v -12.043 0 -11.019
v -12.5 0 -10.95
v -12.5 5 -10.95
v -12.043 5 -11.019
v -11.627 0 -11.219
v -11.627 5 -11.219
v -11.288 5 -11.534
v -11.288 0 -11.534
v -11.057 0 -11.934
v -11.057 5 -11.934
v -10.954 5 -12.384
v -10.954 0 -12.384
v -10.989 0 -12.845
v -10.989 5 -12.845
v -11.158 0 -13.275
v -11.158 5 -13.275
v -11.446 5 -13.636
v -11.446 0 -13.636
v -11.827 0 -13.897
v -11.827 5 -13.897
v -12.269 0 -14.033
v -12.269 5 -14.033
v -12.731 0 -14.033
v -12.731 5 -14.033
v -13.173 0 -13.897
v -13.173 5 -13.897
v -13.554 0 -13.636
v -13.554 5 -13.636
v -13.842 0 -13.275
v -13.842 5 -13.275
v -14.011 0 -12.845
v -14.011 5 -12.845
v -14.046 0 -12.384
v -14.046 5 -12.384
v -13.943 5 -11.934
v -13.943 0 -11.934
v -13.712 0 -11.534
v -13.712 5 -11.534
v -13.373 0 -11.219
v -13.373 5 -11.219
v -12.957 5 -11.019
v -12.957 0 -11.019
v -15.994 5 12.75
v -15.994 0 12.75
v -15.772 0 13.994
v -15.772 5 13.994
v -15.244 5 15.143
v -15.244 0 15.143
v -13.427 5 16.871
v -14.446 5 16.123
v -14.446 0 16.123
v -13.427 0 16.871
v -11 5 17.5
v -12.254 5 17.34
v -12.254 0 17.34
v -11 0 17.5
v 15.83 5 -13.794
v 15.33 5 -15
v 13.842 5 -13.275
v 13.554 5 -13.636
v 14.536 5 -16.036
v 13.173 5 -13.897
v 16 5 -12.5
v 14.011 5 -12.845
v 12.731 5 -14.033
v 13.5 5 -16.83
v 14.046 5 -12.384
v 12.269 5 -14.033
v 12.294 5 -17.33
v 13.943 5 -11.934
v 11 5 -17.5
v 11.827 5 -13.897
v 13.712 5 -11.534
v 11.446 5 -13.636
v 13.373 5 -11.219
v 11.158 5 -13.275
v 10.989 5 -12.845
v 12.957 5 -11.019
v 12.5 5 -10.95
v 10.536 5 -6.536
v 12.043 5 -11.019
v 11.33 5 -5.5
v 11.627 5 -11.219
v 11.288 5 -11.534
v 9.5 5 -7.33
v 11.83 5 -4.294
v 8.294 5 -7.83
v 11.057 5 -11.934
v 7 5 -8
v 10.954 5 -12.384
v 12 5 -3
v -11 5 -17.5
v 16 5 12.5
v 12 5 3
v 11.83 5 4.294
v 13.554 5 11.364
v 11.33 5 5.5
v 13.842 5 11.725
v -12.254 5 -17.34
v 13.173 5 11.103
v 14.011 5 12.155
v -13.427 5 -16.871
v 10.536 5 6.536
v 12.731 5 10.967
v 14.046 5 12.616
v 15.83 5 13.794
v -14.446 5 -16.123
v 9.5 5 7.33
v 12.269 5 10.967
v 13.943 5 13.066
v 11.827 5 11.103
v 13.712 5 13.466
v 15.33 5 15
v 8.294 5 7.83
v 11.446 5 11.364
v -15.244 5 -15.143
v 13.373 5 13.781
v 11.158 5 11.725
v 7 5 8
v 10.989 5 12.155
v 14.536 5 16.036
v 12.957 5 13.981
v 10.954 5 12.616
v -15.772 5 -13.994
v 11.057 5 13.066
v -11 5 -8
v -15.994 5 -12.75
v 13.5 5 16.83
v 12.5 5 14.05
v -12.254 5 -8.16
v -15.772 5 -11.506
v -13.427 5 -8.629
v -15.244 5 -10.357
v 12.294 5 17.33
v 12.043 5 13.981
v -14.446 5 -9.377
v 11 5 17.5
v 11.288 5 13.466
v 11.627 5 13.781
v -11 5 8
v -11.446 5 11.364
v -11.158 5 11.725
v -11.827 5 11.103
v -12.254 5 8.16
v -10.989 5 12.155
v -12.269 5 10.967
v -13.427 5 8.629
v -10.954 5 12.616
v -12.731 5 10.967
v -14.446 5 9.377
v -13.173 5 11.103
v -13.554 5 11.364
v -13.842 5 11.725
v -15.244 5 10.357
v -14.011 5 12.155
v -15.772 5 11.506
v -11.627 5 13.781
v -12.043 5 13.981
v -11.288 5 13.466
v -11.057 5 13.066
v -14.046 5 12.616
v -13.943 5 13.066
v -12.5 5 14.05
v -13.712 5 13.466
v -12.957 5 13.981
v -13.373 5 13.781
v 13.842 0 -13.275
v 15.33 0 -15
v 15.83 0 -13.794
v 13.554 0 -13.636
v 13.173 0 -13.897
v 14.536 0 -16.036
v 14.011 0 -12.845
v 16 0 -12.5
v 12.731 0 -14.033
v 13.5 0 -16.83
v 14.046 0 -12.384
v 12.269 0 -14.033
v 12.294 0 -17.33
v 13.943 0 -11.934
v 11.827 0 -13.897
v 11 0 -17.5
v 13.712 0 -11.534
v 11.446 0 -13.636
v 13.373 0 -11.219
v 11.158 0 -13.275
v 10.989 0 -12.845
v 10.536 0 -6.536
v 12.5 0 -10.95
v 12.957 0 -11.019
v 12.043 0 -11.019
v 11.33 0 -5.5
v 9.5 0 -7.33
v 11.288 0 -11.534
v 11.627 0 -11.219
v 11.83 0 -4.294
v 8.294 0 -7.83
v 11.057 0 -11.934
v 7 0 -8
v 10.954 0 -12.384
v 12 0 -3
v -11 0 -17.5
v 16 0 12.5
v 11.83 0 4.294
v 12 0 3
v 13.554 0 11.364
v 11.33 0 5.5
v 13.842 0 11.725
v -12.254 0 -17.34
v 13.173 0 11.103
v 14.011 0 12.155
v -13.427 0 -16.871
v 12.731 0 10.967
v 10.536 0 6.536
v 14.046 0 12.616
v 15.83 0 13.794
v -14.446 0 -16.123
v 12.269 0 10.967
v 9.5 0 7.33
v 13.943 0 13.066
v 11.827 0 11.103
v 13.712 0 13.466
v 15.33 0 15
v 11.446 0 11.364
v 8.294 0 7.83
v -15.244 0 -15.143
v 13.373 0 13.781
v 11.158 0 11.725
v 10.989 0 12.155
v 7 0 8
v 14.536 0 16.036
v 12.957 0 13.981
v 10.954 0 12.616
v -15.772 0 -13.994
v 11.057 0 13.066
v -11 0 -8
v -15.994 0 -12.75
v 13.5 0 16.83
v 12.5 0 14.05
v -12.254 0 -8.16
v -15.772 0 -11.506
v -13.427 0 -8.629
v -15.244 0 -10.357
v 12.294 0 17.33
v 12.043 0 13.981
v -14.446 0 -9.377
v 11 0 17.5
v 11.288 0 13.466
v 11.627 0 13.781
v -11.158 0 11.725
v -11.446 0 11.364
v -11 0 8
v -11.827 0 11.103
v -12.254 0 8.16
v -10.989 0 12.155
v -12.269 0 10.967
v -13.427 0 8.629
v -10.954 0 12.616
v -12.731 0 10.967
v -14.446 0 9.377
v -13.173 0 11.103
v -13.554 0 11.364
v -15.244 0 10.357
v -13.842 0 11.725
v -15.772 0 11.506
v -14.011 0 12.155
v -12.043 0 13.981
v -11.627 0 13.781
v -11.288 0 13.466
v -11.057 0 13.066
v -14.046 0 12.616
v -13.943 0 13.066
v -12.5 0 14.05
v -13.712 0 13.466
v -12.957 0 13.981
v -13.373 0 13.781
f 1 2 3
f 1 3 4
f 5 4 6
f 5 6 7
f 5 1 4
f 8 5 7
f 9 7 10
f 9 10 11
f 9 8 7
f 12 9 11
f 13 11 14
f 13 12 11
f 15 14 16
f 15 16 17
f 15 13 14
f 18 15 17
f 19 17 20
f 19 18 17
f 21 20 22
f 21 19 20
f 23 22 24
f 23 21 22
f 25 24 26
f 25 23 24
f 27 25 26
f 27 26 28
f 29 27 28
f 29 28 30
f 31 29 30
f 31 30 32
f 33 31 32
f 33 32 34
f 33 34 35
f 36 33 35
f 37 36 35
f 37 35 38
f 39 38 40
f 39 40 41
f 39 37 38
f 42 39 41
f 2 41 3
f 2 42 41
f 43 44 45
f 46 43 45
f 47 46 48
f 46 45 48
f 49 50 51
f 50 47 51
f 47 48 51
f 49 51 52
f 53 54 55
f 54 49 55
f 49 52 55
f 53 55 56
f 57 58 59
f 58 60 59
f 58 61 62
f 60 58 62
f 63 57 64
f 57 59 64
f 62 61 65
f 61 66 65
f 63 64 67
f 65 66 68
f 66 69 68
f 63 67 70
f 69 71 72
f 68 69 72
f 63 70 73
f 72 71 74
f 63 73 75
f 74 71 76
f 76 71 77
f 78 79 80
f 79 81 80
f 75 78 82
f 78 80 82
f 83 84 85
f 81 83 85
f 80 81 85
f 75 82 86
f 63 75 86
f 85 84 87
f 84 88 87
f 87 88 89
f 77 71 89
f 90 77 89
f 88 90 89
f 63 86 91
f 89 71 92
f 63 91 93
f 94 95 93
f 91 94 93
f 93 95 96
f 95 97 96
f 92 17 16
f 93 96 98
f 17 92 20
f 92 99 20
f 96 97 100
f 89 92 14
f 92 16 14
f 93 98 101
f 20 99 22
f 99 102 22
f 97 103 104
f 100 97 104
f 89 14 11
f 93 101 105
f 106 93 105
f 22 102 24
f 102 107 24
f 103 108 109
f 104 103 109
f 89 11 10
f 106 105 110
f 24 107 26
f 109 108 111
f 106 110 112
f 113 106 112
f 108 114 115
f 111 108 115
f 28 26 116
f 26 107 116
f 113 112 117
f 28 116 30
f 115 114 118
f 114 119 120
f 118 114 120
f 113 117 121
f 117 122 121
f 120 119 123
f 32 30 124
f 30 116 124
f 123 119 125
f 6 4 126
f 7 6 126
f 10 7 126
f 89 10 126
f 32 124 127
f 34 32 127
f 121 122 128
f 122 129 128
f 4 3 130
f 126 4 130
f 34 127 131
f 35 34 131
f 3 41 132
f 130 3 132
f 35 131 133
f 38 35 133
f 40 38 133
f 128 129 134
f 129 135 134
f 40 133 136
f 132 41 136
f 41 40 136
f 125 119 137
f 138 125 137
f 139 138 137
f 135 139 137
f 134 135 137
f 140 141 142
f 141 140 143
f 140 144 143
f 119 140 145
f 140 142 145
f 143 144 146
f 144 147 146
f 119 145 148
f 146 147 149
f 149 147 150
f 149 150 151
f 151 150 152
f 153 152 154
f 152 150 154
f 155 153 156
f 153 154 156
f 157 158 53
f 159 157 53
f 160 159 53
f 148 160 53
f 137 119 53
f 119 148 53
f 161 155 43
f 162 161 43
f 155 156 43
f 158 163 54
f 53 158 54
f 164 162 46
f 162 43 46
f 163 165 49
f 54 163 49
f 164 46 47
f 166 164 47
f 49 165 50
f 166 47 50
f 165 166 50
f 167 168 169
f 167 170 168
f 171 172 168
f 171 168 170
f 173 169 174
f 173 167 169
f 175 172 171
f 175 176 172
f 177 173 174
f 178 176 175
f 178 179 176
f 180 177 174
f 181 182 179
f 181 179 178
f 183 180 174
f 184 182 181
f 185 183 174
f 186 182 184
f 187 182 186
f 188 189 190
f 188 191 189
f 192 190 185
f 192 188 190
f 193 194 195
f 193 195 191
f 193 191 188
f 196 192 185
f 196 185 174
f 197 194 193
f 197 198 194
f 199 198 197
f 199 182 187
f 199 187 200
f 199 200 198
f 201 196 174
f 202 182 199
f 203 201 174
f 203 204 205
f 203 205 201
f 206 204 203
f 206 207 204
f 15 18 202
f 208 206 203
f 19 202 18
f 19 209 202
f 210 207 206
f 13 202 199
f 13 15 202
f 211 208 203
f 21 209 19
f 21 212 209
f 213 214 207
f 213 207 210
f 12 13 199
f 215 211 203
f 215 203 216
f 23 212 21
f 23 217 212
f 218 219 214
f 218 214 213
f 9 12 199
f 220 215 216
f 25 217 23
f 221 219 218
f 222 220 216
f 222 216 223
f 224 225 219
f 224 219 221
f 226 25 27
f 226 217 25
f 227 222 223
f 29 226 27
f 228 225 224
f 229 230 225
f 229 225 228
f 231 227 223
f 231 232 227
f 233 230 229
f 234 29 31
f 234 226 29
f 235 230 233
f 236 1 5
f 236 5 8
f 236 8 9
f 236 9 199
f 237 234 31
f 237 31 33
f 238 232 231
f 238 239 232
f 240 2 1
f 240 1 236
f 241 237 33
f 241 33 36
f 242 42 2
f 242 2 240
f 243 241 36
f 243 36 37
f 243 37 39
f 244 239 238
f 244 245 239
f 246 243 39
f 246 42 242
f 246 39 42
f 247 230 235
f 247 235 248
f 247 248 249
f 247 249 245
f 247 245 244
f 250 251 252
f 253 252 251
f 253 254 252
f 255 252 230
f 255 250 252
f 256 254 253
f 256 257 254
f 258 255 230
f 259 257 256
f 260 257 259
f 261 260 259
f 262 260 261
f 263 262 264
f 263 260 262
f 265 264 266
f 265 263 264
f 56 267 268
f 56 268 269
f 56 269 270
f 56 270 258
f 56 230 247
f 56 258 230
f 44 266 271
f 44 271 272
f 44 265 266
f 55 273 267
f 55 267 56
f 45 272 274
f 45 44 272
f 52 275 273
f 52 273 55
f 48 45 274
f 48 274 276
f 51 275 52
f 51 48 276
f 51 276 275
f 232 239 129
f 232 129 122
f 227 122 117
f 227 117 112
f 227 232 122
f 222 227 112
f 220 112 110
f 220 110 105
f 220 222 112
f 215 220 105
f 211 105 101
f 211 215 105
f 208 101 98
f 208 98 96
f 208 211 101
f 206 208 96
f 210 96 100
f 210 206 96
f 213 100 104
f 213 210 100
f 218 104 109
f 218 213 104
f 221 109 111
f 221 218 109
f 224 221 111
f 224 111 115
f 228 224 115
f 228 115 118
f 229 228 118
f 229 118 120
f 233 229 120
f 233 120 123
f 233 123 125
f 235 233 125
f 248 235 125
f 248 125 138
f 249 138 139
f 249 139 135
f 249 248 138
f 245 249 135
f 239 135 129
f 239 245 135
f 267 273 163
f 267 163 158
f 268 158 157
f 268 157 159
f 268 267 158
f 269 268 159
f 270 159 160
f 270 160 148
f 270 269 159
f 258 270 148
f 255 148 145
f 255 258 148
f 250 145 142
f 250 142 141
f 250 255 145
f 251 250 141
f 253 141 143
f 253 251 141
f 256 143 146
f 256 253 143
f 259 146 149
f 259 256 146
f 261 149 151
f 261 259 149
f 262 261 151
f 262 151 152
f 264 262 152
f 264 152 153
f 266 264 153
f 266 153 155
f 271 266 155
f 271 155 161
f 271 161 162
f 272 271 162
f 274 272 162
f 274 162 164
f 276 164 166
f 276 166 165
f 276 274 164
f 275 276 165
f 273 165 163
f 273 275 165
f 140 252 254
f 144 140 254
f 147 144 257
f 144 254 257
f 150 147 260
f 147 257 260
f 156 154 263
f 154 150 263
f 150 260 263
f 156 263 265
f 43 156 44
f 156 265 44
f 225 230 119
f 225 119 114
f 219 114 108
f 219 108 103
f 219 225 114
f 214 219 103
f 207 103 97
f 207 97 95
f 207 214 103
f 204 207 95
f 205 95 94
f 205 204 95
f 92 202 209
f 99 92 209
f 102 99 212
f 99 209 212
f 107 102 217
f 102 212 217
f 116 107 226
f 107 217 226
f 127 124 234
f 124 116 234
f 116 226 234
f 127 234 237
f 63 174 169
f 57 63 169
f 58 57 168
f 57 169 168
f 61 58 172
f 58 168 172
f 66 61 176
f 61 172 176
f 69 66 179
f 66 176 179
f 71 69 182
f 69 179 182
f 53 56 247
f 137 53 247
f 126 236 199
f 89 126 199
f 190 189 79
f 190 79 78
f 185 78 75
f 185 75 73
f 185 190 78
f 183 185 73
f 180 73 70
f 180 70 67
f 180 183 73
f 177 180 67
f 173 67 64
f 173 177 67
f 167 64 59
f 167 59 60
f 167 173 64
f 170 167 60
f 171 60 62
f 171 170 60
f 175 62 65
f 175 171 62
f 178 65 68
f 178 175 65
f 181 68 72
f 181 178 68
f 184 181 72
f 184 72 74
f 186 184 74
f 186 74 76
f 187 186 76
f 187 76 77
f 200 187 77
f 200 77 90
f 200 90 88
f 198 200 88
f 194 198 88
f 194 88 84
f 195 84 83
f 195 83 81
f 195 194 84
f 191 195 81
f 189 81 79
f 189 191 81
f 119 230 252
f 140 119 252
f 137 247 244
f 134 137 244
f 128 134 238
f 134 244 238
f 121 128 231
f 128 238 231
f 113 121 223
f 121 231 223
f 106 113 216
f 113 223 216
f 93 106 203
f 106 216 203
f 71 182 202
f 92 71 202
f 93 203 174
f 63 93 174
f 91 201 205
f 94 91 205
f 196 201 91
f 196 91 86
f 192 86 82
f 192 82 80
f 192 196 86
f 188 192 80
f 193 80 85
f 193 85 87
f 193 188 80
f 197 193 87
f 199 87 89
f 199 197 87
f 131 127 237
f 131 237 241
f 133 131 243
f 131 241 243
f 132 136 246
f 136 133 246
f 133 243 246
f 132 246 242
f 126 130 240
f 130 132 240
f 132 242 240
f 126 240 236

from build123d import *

# Parameters (mm, degrees)
CROQUIS2_R              = 1.55
SALIENTE_EXTRUIR1_DEPTH = 5
REDONDEO9_R             = 5


with BuildPart() as part:
    # Croquis2 → Saliente-Extruir1 (new body)
    with BuildSketch(Plane(origin=(0, 0, 0), x_dir=(1, 0, 0), z_dir=(0, 1, 0))):
        Polygon((16, -17.5), (16, 17.5), (-16, 17.5), (-16, 8), (12, 8), (12, -8), (-16, -8), (-16, -17.5), align=None)
        with Locations(Location((-12.5, -12.5, 0), (0, 0, 270))):
            Circle(CROQUIS2_R, mode=Mode.SUBTRACT)
        with Locations(Location((12.5, -12.5, 0), (0, 0, 270))):
            Circle(CROQUIS2_R, mode=Mode.SUBTRACT)
        with Locations(Location((-12.5, 12.5, 0), (0, 0, 270))):
            Circle(CROQUIS2_R, mode=Mode.SUBTRACT)
        with Locations(Location((12.5, 12.5, 0), (0, 0, 270))):
            Circle(CROQUIS2_R, mode=Mode.SUBTRACT)
    extrude(amount=SALIENTE_EXTRUIR1_DEPTH)

    # Redondeo9
    # the kernel refuses this fillet: 5 mm, written as the material it adds along each edge
    with BuildSketch(Plane(origin=(12, 0, 8), x_dir=(0, 0, -1), z_dir=(0, 1, 0)), Plane(origin=(12, 0, -8), x_dir=(-1, 0, 0), z_dir=(0, 1, 0))) as redondeo9_piece_1:
        with BuildLine():
            CenterArc((REDONDEO9_R, REDONDEO9_R), REDONDEO9_R, 180, 90)
            Line((0, REDONDEO9_R), (0, 0))
            Line((0, 0), (REDONDEO9_R, 0))
        make_face()
    extrude(amount=5)
    # the kernel refuses this fillet: 5 mm, written as the material it takes off along each edge
    with BuildSketch(Plane(origin=(-16, -12.5, 8), x_dir=(0, 0, 1), z_dir=(0, 1, 0))) as redondeo9_2_piece_1:
        with BuildLine():
            CenterArc((REDONDEO9_R, REDONDEO9_R), REDONDEO9_R, 180, 90)
            Line((0, REDONDEO9_R), (0, 0))
            Line((0, 0), (REDONDEO9_R, 0))
        make_face()
    extrude(amount=30, mode=Mode.SUBTRACT)
    with BuildSketch(Plane(origin=(-16, -12.5, 17.5), x_dir=(0, 0, -1), z_dir=(0, 1, 0)), Plane(origin=(-16, -12.5, -17.5), x_dir=(1, 0, 0), z_dir=(0, 1, 0)), Plane(origin=(16, -12.5, -17.5), x_dir=(0, 0, 1), z_dir=(0, 1, 0)), Plane(origin=(-16, -12.5, -8), x_dir=(0, 0, -1), z_dir=(0, 1, 0)), Plane(origin=(16, -12.5, 17.5), x_dir=(-1, 0, 0), z_dir=(0, 1, 0))) as redondeo9_2_piece_2:
        with BuildLine():
            CenterArc((REDONDEO9_R, -REDONDEO9_R), REDONDEO9_R, 90, 90)
            Line((0, -REDONDEO9_R), (0, 0))
            Line((0, 0), (REDONDEO9_R, 0))
        make_face()
    extrude(amount=30, mode=Mode.SUBTRACT)


solid = part.part
